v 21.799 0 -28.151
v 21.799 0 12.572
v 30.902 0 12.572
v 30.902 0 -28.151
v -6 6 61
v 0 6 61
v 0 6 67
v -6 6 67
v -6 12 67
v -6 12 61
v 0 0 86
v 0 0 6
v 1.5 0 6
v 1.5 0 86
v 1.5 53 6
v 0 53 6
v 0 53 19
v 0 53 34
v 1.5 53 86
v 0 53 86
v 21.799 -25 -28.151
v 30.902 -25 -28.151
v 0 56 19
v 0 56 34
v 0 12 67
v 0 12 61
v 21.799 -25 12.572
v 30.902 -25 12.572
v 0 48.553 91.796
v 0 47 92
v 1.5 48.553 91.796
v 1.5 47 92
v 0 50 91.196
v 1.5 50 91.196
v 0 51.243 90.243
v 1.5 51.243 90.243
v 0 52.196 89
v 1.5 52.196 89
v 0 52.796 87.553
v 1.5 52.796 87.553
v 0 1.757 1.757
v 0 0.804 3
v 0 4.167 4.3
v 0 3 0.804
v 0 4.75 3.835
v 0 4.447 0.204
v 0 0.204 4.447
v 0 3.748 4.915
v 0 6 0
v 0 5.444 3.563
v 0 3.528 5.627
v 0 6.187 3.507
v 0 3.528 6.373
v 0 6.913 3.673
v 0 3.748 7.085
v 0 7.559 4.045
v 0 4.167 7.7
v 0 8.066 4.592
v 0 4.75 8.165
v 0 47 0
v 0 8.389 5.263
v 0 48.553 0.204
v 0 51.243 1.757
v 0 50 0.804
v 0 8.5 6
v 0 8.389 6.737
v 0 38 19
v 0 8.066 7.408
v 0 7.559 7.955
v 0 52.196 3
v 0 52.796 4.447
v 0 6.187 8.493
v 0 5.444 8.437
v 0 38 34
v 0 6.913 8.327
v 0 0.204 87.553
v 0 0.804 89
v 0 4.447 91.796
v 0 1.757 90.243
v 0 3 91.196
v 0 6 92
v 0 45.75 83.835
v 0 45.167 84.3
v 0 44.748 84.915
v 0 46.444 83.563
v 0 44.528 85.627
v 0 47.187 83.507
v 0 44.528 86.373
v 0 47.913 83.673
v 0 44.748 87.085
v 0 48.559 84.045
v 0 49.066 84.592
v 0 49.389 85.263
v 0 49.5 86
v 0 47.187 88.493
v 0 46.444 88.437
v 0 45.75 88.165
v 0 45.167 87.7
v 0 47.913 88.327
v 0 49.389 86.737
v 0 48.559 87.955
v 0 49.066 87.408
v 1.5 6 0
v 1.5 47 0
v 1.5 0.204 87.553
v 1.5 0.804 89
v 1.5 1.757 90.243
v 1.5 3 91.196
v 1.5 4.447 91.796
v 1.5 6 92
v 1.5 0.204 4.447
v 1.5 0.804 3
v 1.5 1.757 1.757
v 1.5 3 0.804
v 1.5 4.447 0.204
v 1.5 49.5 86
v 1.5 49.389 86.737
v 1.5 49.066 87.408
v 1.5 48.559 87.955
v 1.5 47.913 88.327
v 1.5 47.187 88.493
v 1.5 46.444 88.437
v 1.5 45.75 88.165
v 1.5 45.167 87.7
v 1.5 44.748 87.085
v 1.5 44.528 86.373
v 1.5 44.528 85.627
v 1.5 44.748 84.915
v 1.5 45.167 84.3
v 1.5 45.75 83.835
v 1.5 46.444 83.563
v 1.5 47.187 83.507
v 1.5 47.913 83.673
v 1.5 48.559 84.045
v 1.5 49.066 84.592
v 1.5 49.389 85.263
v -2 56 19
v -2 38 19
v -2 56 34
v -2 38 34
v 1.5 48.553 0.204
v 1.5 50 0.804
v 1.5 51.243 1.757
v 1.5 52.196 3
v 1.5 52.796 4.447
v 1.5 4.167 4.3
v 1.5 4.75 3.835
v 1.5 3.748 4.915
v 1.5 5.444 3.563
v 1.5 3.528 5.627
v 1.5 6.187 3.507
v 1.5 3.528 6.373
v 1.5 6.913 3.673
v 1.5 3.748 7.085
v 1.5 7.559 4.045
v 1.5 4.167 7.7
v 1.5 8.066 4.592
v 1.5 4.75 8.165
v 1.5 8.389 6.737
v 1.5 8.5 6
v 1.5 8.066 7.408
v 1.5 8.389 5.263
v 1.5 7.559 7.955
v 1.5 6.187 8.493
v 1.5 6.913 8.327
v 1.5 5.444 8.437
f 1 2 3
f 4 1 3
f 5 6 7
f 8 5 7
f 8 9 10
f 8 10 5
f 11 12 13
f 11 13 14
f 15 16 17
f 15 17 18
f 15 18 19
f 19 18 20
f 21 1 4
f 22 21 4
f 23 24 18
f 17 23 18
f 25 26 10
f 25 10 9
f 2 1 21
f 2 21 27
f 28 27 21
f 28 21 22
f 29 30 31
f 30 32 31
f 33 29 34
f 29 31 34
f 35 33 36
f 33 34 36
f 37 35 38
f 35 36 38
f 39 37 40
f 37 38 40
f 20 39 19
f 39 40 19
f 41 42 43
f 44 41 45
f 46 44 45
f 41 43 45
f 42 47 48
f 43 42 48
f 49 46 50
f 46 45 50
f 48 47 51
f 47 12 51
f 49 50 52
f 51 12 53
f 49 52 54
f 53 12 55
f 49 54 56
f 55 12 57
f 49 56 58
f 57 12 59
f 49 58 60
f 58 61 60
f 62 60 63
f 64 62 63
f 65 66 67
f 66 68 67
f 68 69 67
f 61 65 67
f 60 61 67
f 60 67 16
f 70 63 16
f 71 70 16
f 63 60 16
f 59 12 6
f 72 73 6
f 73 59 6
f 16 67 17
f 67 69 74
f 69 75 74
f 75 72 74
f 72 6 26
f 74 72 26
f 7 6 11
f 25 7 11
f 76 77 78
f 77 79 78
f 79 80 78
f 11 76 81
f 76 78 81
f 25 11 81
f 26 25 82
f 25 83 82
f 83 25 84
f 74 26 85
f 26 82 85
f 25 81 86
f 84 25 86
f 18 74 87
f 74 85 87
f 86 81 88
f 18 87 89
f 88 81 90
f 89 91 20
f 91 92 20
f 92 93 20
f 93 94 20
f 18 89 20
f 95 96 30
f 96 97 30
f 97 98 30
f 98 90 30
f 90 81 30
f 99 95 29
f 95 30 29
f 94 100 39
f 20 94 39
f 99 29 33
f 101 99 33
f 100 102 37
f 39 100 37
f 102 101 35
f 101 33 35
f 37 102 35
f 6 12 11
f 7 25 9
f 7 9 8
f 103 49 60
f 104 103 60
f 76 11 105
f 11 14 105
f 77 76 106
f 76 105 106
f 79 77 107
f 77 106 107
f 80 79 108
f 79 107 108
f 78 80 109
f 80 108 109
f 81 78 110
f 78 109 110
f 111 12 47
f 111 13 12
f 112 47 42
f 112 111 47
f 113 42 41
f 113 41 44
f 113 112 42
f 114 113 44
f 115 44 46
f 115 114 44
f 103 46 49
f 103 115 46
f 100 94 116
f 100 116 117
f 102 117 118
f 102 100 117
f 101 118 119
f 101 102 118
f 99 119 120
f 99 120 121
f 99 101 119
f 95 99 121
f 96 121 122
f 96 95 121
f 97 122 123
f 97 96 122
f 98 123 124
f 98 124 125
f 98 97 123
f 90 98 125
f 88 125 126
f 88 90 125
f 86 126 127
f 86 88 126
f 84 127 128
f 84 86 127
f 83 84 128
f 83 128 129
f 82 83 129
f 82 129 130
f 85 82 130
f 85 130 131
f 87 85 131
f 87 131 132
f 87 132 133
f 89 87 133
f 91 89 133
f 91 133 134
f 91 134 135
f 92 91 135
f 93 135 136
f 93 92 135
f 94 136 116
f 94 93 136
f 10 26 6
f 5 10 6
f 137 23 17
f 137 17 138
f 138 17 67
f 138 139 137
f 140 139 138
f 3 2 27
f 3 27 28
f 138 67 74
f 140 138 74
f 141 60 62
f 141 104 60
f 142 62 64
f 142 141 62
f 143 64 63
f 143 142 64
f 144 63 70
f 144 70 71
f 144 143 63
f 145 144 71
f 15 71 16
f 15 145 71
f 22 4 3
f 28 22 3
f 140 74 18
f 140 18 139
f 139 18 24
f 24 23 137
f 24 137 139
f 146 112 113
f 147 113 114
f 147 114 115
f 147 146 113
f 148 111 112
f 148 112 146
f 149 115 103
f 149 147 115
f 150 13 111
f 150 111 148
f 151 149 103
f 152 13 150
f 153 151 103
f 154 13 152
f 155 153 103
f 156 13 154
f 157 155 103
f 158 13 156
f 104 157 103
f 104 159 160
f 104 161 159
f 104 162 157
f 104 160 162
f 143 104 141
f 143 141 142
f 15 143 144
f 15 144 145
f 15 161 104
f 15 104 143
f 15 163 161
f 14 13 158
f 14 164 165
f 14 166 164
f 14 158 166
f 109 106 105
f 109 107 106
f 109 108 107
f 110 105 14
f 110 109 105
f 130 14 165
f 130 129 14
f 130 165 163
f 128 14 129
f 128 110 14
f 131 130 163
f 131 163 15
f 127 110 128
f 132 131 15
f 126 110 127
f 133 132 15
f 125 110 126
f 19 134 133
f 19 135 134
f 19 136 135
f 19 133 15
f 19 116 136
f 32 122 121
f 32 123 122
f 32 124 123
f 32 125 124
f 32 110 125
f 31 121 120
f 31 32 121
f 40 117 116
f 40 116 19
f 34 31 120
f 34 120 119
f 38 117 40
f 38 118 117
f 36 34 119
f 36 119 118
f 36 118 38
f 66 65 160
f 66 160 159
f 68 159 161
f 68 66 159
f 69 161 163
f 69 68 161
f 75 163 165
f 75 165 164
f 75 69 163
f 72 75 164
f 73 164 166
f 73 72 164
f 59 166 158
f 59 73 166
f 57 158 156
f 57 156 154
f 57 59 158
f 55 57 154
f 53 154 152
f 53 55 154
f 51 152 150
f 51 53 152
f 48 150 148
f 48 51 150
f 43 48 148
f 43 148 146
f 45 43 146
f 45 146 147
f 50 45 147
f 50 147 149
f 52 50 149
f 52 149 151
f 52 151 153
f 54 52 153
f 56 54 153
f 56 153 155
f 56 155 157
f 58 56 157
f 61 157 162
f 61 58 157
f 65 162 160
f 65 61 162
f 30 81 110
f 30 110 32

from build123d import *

# Parameters (mm, degrees)
F0_W     = 53
F0_H     = 92
F0_R     = 2.5
F1_DEPTH = 1.5
F2_R     = 6
F3_W     = 6
F3_H     = 6
F4_DEPTH = 6
F5_W     = 3
F5_H     = 15
F5_W_2   = 15
F6_DEPTH = 2
F7_W     = 9.1028660536
F7_H     = 40.7233629376
F8_DEPTH = 25


with BuildPart() as f1:
    # F0 (on Right) → F1 (new body)
    with BuildSketch(Plane.YZ):
        with Locations((26.5, 46)):
            Rectangle(F0_W, F0_H)
        with Locations((6, 6)):
            Circle(F0_R, mode=Mode.SUBTRACT)
        with Locations((47, 86)):
            Circle(F0_R, mode=Mode.SUBTRACT)
    extrude(amount=F1_DEPTH)

    # F2
    f2_edges = [f1.edges().sort_by_distance(p)[0] for p in [
        (0.75, 0, 92),
        (0.75, 53, 92),
        (0.75, 53, 0),
        (0.75, 0, 0),
    ]]
    fillet(f2_edges, radius=F2_R)

    # F3 (on face) → F4 (join)
    with BuildSketch(Plane(origin=(0, 0, 0), x_dir=(0, -1, 0), z_dir=(-1, 0, 0))):
        with Locations((-9, 64)):
            Rectangle(F3_W, F3_H)
    extrude(amount=F4_DEPTH)

    # F5 (on face) → F6 (join)
    with BuildSketch(Plane(origin=(0, 0, 0), x_dir=(0, -1, 0), z_dir=(-1, 0, 0))):
        with Locations((-54.5, 26.5)):
            Rectangle(F5_W, F5_H)
        with Locations((-45.5, 26.5)):
            Rectangle(F5_W_2, F5_H)
    extrude(amount=F6_DEPTH)


with BuildPart() as f8:
    # F7 (on Front) → F8 (new body)
    with BuildSketch(Plane.XZ):
        with Locations((26.3504125178, -7.7893463895)):
            Rectangle(F7_W, F7_H)
    extrude(amount=F8_DEPTH)


solid = Compound([f1.part, f8.part])
